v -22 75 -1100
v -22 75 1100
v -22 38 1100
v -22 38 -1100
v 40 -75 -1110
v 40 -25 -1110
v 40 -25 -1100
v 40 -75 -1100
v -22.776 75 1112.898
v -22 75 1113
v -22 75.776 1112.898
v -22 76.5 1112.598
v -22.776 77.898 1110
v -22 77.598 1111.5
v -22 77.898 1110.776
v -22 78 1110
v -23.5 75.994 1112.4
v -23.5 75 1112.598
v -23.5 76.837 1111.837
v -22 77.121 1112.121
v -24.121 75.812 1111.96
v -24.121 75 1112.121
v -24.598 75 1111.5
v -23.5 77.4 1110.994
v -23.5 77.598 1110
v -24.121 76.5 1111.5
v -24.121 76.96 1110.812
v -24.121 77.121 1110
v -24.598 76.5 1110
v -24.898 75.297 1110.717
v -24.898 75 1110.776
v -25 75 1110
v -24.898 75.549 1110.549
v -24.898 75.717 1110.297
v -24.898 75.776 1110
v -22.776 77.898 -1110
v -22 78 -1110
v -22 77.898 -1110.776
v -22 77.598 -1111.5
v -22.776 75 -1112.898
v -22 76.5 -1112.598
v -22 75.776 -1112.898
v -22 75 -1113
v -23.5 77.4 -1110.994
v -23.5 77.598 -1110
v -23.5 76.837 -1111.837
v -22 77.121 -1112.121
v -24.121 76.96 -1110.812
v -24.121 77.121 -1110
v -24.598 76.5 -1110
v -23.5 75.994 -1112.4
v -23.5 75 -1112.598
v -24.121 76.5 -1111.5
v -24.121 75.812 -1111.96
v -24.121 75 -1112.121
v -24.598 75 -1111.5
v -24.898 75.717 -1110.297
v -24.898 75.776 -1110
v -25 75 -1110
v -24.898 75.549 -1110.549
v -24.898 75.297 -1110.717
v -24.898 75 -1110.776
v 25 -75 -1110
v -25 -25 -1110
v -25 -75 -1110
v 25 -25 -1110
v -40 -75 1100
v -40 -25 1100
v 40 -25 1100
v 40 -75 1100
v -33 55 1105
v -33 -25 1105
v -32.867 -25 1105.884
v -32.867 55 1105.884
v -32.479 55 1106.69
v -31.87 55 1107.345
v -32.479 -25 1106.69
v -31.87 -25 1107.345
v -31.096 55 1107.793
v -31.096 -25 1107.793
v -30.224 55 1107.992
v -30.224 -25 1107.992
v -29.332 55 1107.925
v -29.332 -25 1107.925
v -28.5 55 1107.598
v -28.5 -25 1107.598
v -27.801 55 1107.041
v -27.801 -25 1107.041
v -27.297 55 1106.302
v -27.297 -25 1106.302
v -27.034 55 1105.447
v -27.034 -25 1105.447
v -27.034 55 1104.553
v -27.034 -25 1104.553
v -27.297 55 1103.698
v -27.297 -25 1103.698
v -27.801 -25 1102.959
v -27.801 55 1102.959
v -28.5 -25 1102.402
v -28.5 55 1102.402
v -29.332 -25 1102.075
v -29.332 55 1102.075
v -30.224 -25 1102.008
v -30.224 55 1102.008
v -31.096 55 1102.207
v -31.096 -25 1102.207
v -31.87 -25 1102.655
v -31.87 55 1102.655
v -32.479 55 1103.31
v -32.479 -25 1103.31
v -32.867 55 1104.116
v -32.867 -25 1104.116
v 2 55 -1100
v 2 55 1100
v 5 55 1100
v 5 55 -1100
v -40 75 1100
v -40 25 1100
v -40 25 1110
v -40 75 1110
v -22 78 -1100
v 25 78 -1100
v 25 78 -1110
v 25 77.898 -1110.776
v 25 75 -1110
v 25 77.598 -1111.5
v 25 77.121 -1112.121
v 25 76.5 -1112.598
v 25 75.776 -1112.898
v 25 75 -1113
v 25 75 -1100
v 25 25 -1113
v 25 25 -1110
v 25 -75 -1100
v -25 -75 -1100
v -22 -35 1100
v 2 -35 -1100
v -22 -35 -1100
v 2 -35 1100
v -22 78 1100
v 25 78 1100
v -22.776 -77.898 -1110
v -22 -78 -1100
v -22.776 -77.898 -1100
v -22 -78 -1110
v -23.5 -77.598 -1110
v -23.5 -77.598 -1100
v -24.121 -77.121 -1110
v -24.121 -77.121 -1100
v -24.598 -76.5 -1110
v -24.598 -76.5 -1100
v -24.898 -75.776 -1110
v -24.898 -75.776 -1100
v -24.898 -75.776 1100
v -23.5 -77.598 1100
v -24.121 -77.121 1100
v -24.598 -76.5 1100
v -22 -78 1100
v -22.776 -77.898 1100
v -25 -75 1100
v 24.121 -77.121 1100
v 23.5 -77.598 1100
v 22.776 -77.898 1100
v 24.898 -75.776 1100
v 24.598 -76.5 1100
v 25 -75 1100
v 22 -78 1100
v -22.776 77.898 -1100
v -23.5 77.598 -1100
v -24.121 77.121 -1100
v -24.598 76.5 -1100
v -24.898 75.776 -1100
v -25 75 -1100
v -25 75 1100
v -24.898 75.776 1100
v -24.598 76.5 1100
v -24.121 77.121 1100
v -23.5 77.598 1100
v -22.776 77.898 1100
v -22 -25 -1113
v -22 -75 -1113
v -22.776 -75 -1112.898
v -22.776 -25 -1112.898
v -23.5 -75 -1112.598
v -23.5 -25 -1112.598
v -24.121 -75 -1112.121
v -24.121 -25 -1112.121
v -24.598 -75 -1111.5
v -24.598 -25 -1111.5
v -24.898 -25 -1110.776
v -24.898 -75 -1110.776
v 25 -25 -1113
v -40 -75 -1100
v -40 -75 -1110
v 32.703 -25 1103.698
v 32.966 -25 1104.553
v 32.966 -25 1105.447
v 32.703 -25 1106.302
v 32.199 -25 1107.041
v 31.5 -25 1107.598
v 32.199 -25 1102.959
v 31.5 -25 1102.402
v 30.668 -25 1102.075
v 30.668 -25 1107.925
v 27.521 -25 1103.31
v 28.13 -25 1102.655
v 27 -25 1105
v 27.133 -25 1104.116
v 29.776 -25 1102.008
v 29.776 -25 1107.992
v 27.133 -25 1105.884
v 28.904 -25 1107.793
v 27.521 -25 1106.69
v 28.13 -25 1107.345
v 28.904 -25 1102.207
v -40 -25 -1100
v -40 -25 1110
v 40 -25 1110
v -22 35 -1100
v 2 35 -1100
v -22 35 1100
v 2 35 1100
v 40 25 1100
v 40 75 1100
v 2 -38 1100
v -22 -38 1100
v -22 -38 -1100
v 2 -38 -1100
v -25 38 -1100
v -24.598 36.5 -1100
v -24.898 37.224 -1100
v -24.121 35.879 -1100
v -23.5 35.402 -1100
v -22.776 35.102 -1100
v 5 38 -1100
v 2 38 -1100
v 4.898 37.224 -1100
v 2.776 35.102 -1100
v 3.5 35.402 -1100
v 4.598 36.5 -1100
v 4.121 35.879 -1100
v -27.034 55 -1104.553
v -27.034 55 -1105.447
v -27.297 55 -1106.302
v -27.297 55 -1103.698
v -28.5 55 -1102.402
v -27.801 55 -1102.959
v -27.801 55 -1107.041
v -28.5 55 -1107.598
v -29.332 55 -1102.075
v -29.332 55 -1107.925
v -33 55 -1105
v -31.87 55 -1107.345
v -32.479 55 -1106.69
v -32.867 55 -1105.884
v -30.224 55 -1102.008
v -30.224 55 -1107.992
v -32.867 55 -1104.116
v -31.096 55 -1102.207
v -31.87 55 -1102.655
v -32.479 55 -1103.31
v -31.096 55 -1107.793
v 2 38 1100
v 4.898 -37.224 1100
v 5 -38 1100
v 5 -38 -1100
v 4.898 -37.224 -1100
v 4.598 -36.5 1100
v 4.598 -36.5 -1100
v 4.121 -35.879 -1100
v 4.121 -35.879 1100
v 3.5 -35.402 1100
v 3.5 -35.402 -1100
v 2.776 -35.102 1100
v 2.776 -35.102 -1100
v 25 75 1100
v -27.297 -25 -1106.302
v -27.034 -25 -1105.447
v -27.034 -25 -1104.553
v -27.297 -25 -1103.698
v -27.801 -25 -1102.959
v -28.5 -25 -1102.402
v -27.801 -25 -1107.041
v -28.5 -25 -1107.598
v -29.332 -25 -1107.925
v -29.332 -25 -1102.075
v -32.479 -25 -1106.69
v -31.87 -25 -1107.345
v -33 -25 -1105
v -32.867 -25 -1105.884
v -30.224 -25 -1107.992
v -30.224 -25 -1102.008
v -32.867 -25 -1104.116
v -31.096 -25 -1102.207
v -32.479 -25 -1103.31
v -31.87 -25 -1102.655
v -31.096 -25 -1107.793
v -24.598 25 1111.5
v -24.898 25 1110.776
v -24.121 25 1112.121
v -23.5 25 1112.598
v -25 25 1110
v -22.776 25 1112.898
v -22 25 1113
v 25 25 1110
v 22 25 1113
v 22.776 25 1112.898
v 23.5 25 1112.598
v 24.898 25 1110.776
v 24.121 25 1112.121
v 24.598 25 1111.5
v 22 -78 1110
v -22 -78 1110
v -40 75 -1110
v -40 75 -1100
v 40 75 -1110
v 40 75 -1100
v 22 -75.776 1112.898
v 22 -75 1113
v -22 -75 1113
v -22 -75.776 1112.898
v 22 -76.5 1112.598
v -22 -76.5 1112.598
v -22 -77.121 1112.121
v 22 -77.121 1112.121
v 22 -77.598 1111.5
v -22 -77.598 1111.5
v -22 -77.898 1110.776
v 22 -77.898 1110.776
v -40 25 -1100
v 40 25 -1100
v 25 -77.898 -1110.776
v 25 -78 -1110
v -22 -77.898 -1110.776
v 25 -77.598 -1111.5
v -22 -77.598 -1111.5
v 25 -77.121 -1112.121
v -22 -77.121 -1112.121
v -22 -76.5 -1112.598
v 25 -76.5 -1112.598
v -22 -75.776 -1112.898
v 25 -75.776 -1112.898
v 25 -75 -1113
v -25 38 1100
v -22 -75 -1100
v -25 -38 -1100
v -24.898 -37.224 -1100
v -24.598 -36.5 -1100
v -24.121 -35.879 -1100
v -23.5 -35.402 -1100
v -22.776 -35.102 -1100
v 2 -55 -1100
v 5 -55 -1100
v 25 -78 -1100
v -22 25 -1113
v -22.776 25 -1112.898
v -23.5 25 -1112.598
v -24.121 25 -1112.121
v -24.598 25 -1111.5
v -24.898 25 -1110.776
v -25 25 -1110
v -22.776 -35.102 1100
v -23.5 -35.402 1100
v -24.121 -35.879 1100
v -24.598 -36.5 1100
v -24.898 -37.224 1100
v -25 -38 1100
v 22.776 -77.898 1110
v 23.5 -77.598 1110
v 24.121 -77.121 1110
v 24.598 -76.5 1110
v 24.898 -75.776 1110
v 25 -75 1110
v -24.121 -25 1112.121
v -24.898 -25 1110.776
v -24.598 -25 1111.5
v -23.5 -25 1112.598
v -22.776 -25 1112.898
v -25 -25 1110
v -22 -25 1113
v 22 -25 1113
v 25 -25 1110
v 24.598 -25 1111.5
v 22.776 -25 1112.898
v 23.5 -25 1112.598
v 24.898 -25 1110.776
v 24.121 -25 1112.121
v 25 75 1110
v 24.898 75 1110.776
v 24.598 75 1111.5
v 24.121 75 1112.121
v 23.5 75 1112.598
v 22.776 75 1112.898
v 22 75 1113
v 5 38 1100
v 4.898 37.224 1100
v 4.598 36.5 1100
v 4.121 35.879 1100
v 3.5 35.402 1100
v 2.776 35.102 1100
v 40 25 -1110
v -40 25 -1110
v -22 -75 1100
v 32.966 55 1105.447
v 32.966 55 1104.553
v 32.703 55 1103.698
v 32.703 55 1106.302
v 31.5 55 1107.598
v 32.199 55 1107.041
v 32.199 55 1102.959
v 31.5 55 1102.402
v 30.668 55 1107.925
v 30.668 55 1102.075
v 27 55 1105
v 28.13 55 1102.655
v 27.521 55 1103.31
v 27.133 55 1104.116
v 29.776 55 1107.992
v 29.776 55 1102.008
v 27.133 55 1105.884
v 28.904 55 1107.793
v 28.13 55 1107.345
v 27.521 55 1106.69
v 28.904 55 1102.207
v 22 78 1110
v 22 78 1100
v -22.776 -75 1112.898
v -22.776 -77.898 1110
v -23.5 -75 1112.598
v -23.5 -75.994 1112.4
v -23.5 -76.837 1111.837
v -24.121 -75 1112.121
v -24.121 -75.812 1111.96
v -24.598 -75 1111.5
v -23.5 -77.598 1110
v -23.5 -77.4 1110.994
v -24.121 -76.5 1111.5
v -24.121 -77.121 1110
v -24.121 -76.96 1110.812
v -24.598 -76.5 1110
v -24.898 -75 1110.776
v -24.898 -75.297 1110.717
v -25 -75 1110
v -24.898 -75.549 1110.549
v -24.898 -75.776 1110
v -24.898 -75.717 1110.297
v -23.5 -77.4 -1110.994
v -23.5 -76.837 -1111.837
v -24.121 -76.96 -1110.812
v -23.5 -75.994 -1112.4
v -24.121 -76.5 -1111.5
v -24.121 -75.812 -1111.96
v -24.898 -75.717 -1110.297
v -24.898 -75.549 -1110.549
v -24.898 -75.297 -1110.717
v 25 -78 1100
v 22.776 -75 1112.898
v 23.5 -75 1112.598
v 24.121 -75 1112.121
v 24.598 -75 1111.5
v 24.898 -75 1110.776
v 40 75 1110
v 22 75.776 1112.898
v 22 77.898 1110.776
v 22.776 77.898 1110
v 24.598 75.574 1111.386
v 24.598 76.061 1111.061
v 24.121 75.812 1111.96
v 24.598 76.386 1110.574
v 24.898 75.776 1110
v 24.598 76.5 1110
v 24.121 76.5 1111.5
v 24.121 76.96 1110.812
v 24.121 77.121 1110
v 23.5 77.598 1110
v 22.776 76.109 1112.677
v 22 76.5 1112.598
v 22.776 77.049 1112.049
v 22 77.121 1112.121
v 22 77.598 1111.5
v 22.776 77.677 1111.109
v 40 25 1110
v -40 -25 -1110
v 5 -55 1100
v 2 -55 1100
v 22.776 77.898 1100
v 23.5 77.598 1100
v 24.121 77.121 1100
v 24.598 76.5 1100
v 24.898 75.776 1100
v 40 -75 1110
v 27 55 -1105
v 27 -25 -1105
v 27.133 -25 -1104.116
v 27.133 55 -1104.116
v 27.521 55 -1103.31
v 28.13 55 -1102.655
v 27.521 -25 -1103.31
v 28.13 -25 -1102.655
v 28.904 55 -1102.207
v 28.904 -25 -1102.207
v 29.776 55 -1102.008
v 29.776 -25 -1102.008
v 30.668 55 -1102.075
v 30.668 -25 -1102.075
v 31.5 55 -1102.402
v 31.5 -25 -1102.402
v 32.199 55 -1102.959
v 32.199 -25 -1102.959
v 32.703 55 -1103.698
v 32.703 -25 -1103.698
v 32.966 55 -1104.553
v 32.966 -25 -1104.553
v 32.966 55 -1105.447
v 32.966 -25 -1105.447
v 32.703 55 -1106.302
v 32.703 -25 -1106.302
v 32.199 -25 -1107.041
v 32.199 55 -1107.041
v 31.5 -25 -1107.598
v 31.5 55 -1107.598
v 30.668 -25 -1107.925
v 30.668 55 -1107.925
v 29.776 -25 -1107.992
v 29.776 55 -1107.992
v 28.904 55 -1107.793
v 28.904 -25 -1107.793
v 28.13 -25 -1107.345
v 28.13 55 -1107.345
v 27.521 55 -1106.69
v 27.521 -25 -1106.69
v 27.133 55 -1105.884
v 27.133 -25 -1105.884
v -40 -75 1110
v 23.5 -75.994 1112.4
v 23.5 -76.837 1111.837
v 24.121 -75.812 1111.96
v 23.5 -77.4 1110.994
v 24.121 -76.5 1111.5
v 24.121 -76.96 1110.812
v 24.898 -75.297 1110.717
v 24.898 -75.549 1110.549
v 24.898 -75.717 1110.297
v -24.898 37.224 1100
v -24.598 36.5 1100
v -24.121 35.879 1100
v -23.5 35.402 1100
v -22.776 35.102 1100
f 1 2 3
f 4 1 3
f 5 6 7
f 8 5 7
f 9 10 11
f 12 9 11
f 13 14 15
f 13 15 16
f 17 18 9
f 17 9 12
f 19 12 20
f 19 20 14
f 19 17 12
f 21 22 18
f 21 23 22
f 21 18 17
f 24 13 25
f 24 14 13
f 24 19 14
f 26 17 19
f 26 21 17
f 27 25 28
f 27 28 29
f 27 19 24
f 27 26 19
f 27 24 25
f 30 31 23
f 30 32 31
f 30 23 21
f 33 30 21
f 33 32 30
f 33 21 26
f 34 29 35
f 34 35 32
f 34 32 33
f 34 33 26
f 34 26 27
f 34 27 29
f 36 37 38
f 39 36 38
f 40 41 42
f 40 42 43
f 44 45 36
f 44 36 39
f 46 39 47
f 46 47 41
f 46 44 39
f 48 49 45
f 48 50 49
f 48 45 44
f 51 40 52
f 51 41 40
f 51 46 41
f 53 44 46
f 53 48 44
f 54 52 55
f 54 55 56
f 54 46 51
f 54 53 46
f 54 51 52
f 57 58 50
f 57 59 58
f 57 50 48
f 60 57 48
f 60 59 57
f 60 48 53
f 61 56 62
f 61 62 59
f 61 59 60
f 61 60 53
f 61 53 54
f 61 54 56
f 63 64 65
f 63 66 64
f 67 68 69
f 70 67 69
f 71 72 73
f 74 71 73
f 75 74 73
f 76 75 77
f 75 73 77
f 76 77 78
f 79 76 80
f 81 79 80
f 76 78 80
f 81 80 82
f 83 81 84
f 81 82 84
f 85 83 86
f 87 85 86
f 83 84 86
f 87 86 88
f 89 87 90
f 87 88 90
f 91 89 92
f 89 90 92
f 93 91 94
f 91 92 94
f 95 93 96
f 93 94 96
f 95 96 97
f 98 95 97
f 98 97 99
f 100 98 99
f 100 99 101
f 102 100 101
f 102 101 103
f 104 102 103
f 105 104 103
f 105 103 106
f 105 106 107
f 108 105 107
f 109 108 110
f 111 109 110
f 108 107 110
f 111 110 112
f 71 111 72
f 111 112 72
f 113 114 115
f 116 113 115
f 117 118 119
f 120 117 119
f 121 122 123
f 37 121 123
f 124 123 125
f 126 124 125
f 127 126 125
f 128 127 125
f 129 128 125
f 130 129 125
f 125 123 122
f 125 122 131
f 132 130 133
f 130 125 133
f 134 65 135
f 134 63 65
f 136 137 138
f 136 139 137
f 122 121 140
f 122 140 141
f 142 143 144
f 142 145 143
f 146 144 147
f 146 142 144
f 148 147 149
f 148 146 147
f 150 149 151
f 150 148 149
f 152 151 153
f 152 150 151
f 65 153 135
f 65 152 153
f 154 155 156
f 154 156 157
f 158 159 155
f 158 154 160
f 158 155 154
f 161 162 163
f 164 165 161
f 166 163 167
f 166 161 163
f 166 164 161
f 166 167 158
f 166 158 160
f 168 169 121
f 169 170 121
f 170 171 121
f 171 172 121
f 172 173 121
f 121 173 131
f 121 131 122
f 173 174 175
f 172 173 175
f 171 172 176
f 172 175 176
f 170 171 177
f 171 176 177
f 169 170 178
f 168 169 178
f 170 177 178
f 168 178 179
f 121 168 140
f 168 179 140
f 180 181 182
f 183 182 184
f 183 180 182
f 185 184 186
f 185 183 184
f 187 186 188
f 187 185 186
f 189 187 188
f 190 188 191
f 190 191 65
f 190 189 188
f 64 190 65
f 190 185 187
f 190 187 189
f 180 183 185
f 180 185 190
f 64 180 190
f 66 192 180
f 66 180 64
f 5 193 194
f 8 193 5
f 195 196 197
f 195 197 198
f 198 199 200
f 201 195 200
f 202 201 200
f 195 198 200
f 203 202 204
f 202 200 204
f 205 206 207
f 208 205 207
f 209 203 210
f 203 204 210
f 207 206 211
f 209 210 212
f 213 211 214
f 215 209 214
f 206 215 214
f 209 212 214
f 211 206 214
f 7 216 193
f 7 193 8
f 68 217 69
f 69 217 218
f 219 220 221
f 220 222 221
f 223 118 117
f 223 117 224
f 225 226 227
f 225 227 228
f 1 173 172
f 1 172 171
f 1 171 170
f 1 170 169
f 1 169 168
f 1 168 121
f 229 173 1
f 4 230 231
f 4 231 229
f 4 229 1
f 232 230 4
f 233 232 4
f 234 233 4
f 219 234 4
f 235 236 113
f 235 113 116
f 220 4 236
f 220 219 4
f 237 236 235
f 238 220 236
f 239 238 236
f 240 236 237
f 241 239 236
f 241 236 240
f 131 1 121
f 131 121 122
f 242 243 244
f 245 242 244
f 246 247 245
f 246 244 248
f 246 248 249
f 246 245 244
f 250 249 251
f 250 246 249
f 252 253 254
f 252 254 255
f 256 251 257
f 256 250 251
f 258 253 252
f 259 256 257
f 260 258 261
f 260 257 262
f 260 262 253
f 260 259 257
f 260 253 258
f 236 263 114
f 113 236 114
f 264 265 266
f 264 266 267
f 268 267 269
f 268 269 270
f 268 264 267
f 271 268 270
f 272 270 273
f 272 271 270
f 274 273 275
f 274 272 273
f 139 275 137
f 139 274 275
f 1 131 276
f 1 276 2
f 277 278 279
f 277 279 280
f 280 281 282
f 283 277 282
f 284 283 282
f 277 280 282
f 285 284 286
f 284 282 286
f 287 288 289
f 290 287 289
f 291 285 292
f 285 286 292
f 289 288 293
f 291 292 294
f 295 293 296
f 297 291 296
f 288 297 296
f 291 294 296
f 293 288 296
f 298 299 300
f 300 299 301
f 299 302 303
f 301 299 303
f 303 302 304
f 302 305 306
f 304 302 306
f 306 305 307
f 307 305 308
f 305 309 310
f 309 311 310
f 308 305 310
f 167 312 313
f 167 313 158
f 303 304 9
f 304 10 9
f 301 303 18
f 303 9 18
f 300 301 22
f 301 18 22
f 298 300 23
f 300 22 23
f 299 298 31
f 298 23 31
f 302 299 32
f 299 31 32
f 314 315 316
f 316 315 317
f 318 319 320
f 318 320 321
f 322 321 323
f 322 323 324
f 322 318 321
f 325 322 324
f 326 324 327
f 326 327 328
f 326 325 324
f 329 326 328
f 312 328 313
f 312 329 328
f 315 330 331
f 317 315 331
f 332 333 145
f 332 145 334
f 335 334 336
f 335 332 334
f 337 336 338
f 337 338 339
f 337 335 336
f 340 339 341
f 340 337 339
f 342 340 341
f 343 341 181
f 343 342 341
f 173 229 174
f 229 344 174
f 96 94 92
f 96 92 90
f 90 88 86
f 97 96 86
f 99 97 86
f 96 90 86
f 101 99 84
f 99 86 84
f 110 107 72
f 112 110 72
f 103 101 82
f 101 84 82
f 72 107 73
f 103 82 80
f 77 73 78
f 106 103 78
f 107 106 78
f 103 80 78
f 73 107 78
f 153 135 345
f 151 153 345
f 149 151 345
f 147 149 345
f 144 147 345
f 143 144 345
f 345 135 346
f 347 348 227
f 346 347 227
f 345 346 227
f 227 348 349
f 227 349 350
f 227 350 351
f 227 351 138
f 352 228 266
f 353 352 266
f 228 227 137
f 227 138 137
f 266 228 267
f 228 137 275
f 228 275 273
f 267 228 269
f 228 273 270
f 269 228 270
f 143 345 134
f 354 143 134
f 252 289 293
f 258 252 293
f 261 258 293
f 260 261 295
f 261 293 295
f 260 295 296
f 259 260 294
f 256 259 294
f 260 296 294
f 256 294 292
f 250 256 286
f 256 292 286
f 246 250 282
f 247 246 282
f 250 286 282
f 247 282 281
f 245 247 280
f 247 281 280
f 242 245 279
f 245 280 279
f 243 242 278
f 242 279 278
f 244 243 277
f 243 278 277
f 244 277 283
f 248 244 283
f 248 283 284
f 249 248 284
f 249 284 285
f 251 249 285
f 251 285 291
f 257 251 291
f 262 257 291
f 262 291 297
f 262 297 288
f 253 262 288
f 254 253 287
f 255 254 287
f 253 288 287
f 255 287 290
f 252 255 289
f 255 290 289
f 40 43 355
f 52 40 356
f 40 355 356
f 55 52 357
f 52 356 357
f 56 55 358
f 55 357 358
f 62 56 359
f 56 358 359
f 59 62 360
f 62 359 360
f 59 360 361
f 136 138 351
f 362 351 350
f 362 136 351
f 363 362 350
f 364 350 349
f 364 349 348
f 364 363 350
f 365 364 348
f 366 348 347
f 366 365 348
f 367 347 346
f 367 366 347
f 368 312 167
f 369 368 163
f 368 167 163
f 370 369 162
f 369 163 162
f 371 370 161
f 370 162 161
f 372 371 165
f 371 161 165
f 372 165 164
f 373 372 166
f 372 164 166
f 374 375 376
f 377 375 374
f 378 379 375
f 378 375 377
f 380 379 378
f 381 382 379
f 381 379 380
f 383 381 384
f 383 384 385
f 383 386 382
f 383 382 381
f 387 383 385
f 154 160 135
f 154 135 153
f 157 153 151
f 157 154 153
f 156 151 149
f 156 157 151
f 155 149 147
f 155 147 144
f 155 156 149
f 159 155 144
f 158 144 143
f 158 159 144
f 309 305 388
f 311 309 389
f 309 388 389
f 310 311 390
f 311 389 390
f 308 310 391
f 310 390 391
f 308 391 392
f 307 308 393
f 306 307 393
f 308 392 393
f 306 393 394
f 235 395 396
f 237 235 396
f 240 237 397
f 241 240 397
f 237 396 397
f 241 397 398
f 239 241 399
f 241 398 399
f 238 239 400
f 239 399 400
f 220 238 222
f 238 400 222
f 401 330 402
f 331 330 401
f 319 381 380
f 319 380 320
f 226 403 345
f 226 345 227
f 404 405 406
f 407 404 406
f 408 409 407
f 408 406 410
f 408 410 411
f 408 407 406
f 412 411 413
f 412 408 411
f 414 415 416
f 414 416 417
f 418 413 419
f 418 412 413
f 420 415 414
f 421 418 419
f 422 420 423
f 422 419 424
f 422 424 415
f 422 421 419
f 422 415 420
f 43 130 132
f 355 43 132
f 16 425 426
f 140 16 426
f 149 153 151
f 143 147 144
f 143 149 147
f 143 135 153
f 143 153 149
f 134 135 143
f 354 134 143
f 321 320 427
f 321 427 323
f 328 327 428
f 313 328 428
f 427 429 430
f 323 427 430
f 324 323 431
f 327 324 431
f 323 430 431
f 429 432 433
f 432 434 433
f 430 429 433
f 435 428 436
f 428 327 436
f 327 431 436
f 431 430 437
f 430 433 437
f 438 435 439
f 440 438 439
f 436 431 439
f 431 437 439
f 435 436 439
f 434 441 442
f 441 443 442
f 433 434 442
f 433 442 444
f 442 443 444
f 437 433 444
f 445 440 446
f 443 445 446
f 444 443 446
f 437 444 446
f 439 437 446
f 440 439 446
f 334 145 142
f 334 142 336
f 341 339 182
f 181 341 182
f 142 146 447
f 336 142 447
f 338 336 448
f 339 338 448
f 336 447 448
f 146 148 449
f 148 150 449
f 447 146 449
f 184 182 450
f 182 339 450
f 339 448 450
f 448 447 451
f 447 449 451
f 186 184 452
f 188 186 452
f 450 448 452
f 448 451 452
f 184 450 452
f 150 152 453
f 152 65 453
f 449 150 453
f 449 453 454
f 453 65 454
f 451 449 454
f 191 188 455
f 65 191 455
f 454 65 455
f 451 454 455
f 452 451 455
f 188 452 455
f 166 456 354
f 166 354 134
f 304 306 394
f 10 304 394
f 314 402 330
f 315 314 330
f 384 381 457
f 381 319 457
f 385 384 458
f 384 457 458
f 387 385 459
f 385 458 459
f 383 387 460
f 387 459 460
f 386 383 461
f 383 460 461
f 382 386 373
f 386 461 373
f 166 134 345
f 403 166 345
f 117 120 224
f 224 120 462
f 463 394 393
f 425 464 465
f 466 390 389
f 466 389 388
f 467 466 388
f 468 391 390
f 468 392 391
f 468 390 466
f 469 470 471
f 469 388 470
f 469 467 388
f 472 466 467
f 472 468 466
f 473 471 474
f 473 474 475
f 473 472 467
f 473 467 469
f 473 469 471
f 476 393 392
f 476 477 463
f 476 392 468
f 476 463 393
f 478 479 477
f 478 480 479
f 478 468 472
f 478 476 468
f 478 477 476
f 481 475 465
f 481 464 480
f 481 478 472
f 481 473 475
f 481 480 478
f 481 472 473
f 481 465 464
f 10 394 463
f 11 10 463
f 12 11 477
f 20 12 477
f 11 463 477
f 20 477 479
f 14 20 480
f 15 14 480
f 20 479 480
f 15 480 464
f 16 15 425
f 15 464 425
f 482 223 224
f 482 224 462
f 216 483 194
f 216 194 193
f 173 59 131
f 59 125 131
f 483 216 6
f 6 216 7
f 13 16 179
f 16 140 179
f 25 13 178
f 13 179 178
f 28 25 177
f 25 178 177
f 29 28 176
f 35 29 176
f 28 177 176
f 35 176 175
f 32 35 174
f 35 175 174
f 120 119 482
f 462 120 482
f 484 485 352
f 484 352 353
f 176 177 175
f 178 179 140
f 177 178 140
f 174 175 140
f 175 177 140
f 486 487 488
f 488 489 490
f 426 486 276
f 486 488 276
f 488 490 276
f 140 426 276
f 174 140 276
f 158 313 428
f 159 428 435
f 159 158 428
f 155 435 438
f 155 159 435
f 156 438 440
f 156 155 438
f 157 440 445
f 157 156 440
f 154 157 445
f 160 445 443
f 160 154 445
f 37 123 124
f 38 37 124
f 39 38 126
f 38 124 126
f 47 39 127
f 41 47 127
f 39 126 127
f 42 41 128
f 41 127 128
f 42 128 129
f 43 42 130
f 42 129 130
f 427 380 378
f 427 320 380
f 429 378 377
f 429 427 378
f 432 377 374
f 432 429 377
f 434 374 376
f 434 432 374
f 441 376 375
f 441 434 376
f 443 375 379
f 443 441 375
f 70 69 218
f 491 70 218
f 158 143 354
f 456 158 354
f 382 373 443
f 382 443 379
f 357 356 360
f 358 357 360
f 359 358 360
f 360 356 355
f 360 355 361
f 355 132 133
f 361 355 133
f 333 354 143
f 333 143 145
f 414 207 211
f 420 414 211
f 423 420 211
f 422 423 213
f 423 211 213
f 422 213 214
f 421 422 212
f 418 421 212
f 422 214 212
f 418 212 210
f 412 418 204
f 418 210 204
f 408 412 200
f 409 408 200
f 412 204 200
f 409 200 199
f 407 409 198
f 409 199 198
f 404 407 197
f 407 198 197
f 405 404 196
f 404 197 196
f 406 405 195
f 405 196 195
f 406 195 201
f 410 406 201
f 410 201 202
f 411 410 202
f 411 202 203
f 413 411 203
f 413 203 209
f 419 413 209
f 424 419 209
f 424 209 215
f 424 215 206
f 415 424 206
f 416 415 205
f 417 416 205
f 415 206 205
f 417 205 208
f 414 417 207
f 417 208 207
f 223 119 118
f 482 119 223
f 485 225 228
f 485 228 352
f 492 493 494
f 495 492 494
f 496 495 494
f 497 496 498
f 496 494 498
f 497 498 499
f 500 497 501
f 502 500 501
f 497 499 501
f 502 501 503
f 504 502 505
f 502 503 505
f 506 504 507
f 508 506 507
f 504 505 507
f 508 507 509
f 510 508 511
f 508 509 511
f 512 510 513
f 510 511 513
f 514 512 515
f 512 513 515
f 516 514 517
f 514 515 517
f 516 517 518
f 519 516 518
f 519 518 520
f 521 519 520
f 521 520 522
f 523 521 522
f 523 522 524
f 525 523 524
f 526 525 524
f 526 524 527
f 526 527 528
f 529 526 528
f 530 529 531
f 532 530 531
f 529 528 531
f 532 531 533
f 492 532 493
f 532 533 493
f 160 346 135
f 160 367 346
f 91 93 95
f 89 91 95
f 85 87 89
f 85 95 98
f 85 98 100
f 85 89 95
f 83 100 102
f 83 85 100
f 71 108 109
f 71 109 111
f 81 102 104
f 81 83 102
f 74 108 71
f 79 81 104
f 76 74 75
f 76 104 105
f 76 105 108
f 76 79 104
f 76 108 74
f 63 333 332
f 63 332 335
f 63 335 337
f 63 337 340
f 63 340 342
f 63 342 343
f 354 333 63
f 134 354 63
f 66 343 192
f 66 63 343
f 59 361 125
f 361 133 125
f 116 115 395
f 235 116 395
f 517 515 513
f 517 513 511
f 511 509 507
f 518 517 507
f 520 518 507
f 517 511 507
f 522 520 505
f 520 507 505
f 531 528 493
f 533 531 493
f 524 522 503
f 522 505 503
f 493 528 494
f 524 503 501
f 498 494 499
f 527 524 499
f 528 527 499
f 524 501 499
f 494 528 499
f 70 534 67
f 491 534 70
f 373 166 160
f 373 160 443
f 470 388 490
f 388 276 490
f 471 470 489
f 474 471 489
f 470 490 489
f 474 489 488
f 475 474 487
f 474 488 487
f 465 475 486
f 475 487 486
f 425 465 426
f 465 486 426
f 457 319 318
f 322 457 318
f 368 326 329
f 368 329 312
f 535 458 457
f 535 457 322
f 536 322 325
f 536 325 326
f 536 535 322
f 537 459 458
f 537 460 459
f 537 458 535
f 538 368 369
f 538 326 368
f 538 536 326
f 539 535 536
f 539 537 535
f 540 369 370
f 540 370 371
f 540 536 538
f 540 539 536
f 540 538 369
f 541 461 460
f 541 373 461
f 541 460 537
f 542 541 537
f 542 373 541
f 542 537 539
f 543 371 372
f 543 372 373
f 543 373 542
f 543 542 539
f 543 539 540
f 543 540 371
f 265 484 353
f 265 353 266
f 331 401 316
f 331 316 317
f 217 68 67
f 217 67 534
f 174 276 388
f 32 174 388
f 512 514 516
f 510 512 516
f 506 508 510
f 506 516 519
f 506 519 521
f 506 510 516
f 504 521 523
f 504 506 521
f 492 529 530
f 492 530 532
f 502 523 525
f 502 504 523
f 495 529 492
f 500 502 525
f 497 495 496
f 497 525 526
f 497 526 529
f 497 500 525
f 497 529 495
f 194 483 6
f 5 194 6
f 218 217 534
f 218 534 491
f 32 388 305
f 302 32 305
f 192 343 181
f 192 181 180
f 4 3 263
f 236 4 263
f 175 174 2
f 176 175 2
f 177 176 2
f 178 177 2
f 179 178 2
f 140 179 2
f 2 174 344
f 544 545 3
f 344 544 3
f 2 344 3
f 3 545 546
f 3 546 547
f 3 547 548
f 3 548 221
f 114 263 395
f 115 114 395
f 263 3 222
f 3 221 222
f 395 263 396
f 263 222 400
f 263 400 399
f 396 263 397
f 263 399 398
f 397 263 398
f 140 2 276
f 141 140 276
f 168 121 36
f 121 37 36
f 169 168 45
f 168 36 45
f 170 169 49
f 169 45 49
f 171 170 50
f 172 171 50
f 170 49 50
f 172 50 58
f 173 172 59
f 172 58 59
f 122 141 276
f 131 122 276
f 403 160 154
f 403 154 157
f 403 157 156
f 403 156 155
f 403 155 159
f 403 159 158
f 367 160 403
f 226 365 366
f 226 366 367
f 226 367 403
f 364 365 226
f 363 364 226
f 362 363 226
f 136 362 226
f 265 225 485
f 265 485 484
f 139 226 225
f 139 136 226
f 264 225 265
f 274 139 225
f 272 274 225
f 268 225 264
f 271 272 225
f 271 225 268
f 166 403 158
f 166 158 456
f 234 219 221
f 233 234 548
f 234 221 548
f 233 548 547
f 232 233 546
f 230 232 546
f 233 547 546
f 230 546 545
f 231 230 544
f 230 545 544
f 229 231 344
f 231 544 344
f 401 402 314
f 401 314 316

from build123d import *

# Parameters (mm, degrees)
F1_W     = 80
F1_H     = 10
F2_DEPTH = 50
F4_R     = 3
F5_DEPTH = 80
F7_DEPTH = 1100
F9_DEPTH = 25
F11_R    = 2.99999
F11_2_R  = 2.99999
F11_3_R  = 2.99999
F11_4_R  = 2.99999


# Not quite as in the source:
# - a fillet or chamfer is up to 0.001 mm smaller than in the source, because OpenCascade refuses the exact size
# - a feature names something its author has since deleted; it is built from what else it names


with BuildPart() as f2:
    # F1 (on offset) → F2 (new body)
    with BuildSketch(Plane.XZ.offset(25)):
        with Locations((0, 1105)):
            Rectangle(F1_W, F1_H)
    extrude(amount=F2_DEPTH)


with BuildPart() as f2b:
    # F1 (on offset) → F2, piece 2 (new body)
    with BuildSketch(Plane.XZ.offset(25)):
        with Locations((0, -1105)):
            Rectangle(F1_W, F1_H)
    extrude(amount=F2_DEPTH)


with BuildPart() as f5:
    # F4 (on face) → F5 (new body)
    with BuildSketch(Plane(origin=(0, -25, 0), x_dir=(-1, 0, 0), z_dir=(0, 1, 0))):
        with Locations((-30, 1105)):
            Circle(F4_R)
    extrude(amount=F5_DEPTH)


with BuildPart() as f5b:
    # F4 (on face) → F5, piece 2 (new body)
    with BuildSketch(Plane(origin=(0, -25, 0), x_dir=(-1, 0, 0), z_dir=(0, 1, 0))):
        with Locations((30, 1105)):
            Circle(F4_R)
    extrude(amount=F5_DEPTH)


with BuildPart() as f5c:
    # F4 (on face) → F5, piece 3 (new body)
    with BuildSketch(Plane(origin=(0, -25, 0), x_dir=(-1, 0, 0), z_dir=(0, 1, 0))):
        with Locations((-30, -1105)):
            Circle(F4_R)
    extrude(amount=F5_DEPTH)


with BuildPart() as f5d:
    # F4 (on face) → F5, piece 4 (new body)
    with BuildSketch(Plane(origin=(0, -25, 0), x_dir=(-1, 0, 0), z_dir=(0, 1, 0))):
        with Locations((30, -1105)):
            Circle(F4_R)
    extrude(amount=F5_DEPTH)


with BuildPart() as f7:
    # F6 (on Top) → F7 (new body, symmetric)
    with BuildSketch(Plane.XY):
        with BuildLine():
            Line((-25, -38), (-25, -75))
            ThreePointArc((-25, -75), (-24.1213203436, -77.1213203436), (-22, -78))
            Line((-22, -78), (25, -78))
            Line((25, -78), (25, -75))
            Line((25, -75), (-22, -75))
            Line((-22, -75), (-22, -38))
            Line((-22, -38), (2, -38))
            Line((2, -38), (2, -55))
            Line((2, -55), (5, -55))
            Line((5, -55), (5, -38))
            ThreePointArc((5, -38), (4.1213203436, -35.8786796564), (2, -35))
            Line((2, -35), (-22, -35))
            ThreePointArc((-22, -35), (-24.1213203436, -35.8786796564), (-25, -38))
        make_face()
    extrude(amount=F7_DEPTH, both=True)


with BuildPart() as f9:
    # F8 (on Right) → F9 (new body, symmetric)
    with BuildSketch(Plane.YZ):
        with BuildLine():
            Line((-75, -1110), (-75, -1100))
            Line((-75, -1100), (-78, -1100))
            Line((-78, -1100), (-78, -1110))
            ThreePointArc((-78, -1110), (-77.1213203436, -1112.1213203436), (-75, -1113))
            Line((-75, -1113), (-25, -1113))
            Line((-25, -1113), (-25, -1110))
            Line((-25, -1110), (-75, -1110))
        make_face()
    extrude(amount=F9_DEPTH, both=True)


with BuildPart() as f9b:
    # F8 (on Right) → F9, piece 2 (new body, symmetric)
    with BuildSketch(Plane.YZ):
        with BuildLine():
            ThreePointArc((-75, 1113), (-77.1213203436, 1112.1213203436), (-78, 1110))
            Line((-78, 1110), (-78, 1100))
            Line((-78, 1100), (-75, 1100))
            Line((-75, 1100), (-75, 1110))
            Line((-75, 1110), (-25, 1110))
            Line((-25, 1110), (-25, 1113))
            Line((-25, 1113), (-75, 1113))
        make_face()
    extrude(amount=F9_DEPTH, both=True)


with BuildPart() as f10_1:
    # F10: instance of F2
    add(f2.part.mirror(Plane.XZ))


with BuildPart() as f10_2:
    # F10: instance of F2b
    add(f2b.part.mirror(Plane.XZ))


with BuildPart() as f10_3:
    # F10: instance of F7
    add(f7.part.mirror(Plane.XZ))


with BuildPart() as f10_4:
    # F10: instance of F9b
    add(f9b.part.mirror(Plane.XZ))

    # F11#3 (radius 3 in the source; OpenCascade refuses exactly that, so slightly less here)
    f11_3_edges = [f10_4.edges().sort_by_distance(p)[0] for p in [
        (-25, 78, 1105),
        (25, 78, 1105),
        (-25, 77.12132, 1112.12132),
        (25, 77.12132, 1112.12132),
        (-25, 50, 1113),
        (25, 50, 1113),
    ]]
    fillet(f11_3_edges, radius=F11_3_R)


with BuildPart() as f10_5:
    # F10: instance of F9
    add(f9.part.mirror(Plane.XZ))

    # F11#4 (radius 3 in the source; OpenCascade refuses exactly that, so slightly less here)
    f11_4_edges = [f10_5.edges().sort_by_distance(p)[0] for p in [
        (-25, 50, -1113),
        (-25, 77.12132, -1112.12132),
        (-25, 78, -1105),
    ]]
    fillet(f11_4_edges, radius=F11_4_R)


with BuildPart() as f9_1:
    add(f9.part)

    # F11 (radius 3 in the source; OpenCascade refuses exactly that, so slightly less here)
    f11_edges = [f9_1.edges().sort_by_distance(p)[0] for p in [
        (-25, -78, -1105),
        (-25, -50, -1113),
        (-25, -77.12132, -1112.12132),
    ]]
    fillet(f11_edges, radius=F11_R)


with BuildPart() as f9b_1:
    add(f9b.part)

    # F11#2 (radius 3 in the source; OpenCascade refuses exactly that, so slightly less here)
    f11_2_edges = [f9b_1.edges().sort_by_distance(p)[0] for p in [
        (25, -50, 1113),
        (-25, -50, 1113),
        (-25, -78, 1105),
        (25, -78, 1105),
        (-25, -77.12132, 1112.12132),
        (25, -77.12132, 1112.12132),
    ]]
    fillet(f11_2_edges, radius=F11_2_R)


solid = Compound([f2.part, f2b.part, f5.part, f5b.part, f5c.part, f5d.part, f7.part, f10_1.part, f10_2.part, f10_3.part, f10_4.part, f10_5.part, f9_1.part, f9b_1.part])
